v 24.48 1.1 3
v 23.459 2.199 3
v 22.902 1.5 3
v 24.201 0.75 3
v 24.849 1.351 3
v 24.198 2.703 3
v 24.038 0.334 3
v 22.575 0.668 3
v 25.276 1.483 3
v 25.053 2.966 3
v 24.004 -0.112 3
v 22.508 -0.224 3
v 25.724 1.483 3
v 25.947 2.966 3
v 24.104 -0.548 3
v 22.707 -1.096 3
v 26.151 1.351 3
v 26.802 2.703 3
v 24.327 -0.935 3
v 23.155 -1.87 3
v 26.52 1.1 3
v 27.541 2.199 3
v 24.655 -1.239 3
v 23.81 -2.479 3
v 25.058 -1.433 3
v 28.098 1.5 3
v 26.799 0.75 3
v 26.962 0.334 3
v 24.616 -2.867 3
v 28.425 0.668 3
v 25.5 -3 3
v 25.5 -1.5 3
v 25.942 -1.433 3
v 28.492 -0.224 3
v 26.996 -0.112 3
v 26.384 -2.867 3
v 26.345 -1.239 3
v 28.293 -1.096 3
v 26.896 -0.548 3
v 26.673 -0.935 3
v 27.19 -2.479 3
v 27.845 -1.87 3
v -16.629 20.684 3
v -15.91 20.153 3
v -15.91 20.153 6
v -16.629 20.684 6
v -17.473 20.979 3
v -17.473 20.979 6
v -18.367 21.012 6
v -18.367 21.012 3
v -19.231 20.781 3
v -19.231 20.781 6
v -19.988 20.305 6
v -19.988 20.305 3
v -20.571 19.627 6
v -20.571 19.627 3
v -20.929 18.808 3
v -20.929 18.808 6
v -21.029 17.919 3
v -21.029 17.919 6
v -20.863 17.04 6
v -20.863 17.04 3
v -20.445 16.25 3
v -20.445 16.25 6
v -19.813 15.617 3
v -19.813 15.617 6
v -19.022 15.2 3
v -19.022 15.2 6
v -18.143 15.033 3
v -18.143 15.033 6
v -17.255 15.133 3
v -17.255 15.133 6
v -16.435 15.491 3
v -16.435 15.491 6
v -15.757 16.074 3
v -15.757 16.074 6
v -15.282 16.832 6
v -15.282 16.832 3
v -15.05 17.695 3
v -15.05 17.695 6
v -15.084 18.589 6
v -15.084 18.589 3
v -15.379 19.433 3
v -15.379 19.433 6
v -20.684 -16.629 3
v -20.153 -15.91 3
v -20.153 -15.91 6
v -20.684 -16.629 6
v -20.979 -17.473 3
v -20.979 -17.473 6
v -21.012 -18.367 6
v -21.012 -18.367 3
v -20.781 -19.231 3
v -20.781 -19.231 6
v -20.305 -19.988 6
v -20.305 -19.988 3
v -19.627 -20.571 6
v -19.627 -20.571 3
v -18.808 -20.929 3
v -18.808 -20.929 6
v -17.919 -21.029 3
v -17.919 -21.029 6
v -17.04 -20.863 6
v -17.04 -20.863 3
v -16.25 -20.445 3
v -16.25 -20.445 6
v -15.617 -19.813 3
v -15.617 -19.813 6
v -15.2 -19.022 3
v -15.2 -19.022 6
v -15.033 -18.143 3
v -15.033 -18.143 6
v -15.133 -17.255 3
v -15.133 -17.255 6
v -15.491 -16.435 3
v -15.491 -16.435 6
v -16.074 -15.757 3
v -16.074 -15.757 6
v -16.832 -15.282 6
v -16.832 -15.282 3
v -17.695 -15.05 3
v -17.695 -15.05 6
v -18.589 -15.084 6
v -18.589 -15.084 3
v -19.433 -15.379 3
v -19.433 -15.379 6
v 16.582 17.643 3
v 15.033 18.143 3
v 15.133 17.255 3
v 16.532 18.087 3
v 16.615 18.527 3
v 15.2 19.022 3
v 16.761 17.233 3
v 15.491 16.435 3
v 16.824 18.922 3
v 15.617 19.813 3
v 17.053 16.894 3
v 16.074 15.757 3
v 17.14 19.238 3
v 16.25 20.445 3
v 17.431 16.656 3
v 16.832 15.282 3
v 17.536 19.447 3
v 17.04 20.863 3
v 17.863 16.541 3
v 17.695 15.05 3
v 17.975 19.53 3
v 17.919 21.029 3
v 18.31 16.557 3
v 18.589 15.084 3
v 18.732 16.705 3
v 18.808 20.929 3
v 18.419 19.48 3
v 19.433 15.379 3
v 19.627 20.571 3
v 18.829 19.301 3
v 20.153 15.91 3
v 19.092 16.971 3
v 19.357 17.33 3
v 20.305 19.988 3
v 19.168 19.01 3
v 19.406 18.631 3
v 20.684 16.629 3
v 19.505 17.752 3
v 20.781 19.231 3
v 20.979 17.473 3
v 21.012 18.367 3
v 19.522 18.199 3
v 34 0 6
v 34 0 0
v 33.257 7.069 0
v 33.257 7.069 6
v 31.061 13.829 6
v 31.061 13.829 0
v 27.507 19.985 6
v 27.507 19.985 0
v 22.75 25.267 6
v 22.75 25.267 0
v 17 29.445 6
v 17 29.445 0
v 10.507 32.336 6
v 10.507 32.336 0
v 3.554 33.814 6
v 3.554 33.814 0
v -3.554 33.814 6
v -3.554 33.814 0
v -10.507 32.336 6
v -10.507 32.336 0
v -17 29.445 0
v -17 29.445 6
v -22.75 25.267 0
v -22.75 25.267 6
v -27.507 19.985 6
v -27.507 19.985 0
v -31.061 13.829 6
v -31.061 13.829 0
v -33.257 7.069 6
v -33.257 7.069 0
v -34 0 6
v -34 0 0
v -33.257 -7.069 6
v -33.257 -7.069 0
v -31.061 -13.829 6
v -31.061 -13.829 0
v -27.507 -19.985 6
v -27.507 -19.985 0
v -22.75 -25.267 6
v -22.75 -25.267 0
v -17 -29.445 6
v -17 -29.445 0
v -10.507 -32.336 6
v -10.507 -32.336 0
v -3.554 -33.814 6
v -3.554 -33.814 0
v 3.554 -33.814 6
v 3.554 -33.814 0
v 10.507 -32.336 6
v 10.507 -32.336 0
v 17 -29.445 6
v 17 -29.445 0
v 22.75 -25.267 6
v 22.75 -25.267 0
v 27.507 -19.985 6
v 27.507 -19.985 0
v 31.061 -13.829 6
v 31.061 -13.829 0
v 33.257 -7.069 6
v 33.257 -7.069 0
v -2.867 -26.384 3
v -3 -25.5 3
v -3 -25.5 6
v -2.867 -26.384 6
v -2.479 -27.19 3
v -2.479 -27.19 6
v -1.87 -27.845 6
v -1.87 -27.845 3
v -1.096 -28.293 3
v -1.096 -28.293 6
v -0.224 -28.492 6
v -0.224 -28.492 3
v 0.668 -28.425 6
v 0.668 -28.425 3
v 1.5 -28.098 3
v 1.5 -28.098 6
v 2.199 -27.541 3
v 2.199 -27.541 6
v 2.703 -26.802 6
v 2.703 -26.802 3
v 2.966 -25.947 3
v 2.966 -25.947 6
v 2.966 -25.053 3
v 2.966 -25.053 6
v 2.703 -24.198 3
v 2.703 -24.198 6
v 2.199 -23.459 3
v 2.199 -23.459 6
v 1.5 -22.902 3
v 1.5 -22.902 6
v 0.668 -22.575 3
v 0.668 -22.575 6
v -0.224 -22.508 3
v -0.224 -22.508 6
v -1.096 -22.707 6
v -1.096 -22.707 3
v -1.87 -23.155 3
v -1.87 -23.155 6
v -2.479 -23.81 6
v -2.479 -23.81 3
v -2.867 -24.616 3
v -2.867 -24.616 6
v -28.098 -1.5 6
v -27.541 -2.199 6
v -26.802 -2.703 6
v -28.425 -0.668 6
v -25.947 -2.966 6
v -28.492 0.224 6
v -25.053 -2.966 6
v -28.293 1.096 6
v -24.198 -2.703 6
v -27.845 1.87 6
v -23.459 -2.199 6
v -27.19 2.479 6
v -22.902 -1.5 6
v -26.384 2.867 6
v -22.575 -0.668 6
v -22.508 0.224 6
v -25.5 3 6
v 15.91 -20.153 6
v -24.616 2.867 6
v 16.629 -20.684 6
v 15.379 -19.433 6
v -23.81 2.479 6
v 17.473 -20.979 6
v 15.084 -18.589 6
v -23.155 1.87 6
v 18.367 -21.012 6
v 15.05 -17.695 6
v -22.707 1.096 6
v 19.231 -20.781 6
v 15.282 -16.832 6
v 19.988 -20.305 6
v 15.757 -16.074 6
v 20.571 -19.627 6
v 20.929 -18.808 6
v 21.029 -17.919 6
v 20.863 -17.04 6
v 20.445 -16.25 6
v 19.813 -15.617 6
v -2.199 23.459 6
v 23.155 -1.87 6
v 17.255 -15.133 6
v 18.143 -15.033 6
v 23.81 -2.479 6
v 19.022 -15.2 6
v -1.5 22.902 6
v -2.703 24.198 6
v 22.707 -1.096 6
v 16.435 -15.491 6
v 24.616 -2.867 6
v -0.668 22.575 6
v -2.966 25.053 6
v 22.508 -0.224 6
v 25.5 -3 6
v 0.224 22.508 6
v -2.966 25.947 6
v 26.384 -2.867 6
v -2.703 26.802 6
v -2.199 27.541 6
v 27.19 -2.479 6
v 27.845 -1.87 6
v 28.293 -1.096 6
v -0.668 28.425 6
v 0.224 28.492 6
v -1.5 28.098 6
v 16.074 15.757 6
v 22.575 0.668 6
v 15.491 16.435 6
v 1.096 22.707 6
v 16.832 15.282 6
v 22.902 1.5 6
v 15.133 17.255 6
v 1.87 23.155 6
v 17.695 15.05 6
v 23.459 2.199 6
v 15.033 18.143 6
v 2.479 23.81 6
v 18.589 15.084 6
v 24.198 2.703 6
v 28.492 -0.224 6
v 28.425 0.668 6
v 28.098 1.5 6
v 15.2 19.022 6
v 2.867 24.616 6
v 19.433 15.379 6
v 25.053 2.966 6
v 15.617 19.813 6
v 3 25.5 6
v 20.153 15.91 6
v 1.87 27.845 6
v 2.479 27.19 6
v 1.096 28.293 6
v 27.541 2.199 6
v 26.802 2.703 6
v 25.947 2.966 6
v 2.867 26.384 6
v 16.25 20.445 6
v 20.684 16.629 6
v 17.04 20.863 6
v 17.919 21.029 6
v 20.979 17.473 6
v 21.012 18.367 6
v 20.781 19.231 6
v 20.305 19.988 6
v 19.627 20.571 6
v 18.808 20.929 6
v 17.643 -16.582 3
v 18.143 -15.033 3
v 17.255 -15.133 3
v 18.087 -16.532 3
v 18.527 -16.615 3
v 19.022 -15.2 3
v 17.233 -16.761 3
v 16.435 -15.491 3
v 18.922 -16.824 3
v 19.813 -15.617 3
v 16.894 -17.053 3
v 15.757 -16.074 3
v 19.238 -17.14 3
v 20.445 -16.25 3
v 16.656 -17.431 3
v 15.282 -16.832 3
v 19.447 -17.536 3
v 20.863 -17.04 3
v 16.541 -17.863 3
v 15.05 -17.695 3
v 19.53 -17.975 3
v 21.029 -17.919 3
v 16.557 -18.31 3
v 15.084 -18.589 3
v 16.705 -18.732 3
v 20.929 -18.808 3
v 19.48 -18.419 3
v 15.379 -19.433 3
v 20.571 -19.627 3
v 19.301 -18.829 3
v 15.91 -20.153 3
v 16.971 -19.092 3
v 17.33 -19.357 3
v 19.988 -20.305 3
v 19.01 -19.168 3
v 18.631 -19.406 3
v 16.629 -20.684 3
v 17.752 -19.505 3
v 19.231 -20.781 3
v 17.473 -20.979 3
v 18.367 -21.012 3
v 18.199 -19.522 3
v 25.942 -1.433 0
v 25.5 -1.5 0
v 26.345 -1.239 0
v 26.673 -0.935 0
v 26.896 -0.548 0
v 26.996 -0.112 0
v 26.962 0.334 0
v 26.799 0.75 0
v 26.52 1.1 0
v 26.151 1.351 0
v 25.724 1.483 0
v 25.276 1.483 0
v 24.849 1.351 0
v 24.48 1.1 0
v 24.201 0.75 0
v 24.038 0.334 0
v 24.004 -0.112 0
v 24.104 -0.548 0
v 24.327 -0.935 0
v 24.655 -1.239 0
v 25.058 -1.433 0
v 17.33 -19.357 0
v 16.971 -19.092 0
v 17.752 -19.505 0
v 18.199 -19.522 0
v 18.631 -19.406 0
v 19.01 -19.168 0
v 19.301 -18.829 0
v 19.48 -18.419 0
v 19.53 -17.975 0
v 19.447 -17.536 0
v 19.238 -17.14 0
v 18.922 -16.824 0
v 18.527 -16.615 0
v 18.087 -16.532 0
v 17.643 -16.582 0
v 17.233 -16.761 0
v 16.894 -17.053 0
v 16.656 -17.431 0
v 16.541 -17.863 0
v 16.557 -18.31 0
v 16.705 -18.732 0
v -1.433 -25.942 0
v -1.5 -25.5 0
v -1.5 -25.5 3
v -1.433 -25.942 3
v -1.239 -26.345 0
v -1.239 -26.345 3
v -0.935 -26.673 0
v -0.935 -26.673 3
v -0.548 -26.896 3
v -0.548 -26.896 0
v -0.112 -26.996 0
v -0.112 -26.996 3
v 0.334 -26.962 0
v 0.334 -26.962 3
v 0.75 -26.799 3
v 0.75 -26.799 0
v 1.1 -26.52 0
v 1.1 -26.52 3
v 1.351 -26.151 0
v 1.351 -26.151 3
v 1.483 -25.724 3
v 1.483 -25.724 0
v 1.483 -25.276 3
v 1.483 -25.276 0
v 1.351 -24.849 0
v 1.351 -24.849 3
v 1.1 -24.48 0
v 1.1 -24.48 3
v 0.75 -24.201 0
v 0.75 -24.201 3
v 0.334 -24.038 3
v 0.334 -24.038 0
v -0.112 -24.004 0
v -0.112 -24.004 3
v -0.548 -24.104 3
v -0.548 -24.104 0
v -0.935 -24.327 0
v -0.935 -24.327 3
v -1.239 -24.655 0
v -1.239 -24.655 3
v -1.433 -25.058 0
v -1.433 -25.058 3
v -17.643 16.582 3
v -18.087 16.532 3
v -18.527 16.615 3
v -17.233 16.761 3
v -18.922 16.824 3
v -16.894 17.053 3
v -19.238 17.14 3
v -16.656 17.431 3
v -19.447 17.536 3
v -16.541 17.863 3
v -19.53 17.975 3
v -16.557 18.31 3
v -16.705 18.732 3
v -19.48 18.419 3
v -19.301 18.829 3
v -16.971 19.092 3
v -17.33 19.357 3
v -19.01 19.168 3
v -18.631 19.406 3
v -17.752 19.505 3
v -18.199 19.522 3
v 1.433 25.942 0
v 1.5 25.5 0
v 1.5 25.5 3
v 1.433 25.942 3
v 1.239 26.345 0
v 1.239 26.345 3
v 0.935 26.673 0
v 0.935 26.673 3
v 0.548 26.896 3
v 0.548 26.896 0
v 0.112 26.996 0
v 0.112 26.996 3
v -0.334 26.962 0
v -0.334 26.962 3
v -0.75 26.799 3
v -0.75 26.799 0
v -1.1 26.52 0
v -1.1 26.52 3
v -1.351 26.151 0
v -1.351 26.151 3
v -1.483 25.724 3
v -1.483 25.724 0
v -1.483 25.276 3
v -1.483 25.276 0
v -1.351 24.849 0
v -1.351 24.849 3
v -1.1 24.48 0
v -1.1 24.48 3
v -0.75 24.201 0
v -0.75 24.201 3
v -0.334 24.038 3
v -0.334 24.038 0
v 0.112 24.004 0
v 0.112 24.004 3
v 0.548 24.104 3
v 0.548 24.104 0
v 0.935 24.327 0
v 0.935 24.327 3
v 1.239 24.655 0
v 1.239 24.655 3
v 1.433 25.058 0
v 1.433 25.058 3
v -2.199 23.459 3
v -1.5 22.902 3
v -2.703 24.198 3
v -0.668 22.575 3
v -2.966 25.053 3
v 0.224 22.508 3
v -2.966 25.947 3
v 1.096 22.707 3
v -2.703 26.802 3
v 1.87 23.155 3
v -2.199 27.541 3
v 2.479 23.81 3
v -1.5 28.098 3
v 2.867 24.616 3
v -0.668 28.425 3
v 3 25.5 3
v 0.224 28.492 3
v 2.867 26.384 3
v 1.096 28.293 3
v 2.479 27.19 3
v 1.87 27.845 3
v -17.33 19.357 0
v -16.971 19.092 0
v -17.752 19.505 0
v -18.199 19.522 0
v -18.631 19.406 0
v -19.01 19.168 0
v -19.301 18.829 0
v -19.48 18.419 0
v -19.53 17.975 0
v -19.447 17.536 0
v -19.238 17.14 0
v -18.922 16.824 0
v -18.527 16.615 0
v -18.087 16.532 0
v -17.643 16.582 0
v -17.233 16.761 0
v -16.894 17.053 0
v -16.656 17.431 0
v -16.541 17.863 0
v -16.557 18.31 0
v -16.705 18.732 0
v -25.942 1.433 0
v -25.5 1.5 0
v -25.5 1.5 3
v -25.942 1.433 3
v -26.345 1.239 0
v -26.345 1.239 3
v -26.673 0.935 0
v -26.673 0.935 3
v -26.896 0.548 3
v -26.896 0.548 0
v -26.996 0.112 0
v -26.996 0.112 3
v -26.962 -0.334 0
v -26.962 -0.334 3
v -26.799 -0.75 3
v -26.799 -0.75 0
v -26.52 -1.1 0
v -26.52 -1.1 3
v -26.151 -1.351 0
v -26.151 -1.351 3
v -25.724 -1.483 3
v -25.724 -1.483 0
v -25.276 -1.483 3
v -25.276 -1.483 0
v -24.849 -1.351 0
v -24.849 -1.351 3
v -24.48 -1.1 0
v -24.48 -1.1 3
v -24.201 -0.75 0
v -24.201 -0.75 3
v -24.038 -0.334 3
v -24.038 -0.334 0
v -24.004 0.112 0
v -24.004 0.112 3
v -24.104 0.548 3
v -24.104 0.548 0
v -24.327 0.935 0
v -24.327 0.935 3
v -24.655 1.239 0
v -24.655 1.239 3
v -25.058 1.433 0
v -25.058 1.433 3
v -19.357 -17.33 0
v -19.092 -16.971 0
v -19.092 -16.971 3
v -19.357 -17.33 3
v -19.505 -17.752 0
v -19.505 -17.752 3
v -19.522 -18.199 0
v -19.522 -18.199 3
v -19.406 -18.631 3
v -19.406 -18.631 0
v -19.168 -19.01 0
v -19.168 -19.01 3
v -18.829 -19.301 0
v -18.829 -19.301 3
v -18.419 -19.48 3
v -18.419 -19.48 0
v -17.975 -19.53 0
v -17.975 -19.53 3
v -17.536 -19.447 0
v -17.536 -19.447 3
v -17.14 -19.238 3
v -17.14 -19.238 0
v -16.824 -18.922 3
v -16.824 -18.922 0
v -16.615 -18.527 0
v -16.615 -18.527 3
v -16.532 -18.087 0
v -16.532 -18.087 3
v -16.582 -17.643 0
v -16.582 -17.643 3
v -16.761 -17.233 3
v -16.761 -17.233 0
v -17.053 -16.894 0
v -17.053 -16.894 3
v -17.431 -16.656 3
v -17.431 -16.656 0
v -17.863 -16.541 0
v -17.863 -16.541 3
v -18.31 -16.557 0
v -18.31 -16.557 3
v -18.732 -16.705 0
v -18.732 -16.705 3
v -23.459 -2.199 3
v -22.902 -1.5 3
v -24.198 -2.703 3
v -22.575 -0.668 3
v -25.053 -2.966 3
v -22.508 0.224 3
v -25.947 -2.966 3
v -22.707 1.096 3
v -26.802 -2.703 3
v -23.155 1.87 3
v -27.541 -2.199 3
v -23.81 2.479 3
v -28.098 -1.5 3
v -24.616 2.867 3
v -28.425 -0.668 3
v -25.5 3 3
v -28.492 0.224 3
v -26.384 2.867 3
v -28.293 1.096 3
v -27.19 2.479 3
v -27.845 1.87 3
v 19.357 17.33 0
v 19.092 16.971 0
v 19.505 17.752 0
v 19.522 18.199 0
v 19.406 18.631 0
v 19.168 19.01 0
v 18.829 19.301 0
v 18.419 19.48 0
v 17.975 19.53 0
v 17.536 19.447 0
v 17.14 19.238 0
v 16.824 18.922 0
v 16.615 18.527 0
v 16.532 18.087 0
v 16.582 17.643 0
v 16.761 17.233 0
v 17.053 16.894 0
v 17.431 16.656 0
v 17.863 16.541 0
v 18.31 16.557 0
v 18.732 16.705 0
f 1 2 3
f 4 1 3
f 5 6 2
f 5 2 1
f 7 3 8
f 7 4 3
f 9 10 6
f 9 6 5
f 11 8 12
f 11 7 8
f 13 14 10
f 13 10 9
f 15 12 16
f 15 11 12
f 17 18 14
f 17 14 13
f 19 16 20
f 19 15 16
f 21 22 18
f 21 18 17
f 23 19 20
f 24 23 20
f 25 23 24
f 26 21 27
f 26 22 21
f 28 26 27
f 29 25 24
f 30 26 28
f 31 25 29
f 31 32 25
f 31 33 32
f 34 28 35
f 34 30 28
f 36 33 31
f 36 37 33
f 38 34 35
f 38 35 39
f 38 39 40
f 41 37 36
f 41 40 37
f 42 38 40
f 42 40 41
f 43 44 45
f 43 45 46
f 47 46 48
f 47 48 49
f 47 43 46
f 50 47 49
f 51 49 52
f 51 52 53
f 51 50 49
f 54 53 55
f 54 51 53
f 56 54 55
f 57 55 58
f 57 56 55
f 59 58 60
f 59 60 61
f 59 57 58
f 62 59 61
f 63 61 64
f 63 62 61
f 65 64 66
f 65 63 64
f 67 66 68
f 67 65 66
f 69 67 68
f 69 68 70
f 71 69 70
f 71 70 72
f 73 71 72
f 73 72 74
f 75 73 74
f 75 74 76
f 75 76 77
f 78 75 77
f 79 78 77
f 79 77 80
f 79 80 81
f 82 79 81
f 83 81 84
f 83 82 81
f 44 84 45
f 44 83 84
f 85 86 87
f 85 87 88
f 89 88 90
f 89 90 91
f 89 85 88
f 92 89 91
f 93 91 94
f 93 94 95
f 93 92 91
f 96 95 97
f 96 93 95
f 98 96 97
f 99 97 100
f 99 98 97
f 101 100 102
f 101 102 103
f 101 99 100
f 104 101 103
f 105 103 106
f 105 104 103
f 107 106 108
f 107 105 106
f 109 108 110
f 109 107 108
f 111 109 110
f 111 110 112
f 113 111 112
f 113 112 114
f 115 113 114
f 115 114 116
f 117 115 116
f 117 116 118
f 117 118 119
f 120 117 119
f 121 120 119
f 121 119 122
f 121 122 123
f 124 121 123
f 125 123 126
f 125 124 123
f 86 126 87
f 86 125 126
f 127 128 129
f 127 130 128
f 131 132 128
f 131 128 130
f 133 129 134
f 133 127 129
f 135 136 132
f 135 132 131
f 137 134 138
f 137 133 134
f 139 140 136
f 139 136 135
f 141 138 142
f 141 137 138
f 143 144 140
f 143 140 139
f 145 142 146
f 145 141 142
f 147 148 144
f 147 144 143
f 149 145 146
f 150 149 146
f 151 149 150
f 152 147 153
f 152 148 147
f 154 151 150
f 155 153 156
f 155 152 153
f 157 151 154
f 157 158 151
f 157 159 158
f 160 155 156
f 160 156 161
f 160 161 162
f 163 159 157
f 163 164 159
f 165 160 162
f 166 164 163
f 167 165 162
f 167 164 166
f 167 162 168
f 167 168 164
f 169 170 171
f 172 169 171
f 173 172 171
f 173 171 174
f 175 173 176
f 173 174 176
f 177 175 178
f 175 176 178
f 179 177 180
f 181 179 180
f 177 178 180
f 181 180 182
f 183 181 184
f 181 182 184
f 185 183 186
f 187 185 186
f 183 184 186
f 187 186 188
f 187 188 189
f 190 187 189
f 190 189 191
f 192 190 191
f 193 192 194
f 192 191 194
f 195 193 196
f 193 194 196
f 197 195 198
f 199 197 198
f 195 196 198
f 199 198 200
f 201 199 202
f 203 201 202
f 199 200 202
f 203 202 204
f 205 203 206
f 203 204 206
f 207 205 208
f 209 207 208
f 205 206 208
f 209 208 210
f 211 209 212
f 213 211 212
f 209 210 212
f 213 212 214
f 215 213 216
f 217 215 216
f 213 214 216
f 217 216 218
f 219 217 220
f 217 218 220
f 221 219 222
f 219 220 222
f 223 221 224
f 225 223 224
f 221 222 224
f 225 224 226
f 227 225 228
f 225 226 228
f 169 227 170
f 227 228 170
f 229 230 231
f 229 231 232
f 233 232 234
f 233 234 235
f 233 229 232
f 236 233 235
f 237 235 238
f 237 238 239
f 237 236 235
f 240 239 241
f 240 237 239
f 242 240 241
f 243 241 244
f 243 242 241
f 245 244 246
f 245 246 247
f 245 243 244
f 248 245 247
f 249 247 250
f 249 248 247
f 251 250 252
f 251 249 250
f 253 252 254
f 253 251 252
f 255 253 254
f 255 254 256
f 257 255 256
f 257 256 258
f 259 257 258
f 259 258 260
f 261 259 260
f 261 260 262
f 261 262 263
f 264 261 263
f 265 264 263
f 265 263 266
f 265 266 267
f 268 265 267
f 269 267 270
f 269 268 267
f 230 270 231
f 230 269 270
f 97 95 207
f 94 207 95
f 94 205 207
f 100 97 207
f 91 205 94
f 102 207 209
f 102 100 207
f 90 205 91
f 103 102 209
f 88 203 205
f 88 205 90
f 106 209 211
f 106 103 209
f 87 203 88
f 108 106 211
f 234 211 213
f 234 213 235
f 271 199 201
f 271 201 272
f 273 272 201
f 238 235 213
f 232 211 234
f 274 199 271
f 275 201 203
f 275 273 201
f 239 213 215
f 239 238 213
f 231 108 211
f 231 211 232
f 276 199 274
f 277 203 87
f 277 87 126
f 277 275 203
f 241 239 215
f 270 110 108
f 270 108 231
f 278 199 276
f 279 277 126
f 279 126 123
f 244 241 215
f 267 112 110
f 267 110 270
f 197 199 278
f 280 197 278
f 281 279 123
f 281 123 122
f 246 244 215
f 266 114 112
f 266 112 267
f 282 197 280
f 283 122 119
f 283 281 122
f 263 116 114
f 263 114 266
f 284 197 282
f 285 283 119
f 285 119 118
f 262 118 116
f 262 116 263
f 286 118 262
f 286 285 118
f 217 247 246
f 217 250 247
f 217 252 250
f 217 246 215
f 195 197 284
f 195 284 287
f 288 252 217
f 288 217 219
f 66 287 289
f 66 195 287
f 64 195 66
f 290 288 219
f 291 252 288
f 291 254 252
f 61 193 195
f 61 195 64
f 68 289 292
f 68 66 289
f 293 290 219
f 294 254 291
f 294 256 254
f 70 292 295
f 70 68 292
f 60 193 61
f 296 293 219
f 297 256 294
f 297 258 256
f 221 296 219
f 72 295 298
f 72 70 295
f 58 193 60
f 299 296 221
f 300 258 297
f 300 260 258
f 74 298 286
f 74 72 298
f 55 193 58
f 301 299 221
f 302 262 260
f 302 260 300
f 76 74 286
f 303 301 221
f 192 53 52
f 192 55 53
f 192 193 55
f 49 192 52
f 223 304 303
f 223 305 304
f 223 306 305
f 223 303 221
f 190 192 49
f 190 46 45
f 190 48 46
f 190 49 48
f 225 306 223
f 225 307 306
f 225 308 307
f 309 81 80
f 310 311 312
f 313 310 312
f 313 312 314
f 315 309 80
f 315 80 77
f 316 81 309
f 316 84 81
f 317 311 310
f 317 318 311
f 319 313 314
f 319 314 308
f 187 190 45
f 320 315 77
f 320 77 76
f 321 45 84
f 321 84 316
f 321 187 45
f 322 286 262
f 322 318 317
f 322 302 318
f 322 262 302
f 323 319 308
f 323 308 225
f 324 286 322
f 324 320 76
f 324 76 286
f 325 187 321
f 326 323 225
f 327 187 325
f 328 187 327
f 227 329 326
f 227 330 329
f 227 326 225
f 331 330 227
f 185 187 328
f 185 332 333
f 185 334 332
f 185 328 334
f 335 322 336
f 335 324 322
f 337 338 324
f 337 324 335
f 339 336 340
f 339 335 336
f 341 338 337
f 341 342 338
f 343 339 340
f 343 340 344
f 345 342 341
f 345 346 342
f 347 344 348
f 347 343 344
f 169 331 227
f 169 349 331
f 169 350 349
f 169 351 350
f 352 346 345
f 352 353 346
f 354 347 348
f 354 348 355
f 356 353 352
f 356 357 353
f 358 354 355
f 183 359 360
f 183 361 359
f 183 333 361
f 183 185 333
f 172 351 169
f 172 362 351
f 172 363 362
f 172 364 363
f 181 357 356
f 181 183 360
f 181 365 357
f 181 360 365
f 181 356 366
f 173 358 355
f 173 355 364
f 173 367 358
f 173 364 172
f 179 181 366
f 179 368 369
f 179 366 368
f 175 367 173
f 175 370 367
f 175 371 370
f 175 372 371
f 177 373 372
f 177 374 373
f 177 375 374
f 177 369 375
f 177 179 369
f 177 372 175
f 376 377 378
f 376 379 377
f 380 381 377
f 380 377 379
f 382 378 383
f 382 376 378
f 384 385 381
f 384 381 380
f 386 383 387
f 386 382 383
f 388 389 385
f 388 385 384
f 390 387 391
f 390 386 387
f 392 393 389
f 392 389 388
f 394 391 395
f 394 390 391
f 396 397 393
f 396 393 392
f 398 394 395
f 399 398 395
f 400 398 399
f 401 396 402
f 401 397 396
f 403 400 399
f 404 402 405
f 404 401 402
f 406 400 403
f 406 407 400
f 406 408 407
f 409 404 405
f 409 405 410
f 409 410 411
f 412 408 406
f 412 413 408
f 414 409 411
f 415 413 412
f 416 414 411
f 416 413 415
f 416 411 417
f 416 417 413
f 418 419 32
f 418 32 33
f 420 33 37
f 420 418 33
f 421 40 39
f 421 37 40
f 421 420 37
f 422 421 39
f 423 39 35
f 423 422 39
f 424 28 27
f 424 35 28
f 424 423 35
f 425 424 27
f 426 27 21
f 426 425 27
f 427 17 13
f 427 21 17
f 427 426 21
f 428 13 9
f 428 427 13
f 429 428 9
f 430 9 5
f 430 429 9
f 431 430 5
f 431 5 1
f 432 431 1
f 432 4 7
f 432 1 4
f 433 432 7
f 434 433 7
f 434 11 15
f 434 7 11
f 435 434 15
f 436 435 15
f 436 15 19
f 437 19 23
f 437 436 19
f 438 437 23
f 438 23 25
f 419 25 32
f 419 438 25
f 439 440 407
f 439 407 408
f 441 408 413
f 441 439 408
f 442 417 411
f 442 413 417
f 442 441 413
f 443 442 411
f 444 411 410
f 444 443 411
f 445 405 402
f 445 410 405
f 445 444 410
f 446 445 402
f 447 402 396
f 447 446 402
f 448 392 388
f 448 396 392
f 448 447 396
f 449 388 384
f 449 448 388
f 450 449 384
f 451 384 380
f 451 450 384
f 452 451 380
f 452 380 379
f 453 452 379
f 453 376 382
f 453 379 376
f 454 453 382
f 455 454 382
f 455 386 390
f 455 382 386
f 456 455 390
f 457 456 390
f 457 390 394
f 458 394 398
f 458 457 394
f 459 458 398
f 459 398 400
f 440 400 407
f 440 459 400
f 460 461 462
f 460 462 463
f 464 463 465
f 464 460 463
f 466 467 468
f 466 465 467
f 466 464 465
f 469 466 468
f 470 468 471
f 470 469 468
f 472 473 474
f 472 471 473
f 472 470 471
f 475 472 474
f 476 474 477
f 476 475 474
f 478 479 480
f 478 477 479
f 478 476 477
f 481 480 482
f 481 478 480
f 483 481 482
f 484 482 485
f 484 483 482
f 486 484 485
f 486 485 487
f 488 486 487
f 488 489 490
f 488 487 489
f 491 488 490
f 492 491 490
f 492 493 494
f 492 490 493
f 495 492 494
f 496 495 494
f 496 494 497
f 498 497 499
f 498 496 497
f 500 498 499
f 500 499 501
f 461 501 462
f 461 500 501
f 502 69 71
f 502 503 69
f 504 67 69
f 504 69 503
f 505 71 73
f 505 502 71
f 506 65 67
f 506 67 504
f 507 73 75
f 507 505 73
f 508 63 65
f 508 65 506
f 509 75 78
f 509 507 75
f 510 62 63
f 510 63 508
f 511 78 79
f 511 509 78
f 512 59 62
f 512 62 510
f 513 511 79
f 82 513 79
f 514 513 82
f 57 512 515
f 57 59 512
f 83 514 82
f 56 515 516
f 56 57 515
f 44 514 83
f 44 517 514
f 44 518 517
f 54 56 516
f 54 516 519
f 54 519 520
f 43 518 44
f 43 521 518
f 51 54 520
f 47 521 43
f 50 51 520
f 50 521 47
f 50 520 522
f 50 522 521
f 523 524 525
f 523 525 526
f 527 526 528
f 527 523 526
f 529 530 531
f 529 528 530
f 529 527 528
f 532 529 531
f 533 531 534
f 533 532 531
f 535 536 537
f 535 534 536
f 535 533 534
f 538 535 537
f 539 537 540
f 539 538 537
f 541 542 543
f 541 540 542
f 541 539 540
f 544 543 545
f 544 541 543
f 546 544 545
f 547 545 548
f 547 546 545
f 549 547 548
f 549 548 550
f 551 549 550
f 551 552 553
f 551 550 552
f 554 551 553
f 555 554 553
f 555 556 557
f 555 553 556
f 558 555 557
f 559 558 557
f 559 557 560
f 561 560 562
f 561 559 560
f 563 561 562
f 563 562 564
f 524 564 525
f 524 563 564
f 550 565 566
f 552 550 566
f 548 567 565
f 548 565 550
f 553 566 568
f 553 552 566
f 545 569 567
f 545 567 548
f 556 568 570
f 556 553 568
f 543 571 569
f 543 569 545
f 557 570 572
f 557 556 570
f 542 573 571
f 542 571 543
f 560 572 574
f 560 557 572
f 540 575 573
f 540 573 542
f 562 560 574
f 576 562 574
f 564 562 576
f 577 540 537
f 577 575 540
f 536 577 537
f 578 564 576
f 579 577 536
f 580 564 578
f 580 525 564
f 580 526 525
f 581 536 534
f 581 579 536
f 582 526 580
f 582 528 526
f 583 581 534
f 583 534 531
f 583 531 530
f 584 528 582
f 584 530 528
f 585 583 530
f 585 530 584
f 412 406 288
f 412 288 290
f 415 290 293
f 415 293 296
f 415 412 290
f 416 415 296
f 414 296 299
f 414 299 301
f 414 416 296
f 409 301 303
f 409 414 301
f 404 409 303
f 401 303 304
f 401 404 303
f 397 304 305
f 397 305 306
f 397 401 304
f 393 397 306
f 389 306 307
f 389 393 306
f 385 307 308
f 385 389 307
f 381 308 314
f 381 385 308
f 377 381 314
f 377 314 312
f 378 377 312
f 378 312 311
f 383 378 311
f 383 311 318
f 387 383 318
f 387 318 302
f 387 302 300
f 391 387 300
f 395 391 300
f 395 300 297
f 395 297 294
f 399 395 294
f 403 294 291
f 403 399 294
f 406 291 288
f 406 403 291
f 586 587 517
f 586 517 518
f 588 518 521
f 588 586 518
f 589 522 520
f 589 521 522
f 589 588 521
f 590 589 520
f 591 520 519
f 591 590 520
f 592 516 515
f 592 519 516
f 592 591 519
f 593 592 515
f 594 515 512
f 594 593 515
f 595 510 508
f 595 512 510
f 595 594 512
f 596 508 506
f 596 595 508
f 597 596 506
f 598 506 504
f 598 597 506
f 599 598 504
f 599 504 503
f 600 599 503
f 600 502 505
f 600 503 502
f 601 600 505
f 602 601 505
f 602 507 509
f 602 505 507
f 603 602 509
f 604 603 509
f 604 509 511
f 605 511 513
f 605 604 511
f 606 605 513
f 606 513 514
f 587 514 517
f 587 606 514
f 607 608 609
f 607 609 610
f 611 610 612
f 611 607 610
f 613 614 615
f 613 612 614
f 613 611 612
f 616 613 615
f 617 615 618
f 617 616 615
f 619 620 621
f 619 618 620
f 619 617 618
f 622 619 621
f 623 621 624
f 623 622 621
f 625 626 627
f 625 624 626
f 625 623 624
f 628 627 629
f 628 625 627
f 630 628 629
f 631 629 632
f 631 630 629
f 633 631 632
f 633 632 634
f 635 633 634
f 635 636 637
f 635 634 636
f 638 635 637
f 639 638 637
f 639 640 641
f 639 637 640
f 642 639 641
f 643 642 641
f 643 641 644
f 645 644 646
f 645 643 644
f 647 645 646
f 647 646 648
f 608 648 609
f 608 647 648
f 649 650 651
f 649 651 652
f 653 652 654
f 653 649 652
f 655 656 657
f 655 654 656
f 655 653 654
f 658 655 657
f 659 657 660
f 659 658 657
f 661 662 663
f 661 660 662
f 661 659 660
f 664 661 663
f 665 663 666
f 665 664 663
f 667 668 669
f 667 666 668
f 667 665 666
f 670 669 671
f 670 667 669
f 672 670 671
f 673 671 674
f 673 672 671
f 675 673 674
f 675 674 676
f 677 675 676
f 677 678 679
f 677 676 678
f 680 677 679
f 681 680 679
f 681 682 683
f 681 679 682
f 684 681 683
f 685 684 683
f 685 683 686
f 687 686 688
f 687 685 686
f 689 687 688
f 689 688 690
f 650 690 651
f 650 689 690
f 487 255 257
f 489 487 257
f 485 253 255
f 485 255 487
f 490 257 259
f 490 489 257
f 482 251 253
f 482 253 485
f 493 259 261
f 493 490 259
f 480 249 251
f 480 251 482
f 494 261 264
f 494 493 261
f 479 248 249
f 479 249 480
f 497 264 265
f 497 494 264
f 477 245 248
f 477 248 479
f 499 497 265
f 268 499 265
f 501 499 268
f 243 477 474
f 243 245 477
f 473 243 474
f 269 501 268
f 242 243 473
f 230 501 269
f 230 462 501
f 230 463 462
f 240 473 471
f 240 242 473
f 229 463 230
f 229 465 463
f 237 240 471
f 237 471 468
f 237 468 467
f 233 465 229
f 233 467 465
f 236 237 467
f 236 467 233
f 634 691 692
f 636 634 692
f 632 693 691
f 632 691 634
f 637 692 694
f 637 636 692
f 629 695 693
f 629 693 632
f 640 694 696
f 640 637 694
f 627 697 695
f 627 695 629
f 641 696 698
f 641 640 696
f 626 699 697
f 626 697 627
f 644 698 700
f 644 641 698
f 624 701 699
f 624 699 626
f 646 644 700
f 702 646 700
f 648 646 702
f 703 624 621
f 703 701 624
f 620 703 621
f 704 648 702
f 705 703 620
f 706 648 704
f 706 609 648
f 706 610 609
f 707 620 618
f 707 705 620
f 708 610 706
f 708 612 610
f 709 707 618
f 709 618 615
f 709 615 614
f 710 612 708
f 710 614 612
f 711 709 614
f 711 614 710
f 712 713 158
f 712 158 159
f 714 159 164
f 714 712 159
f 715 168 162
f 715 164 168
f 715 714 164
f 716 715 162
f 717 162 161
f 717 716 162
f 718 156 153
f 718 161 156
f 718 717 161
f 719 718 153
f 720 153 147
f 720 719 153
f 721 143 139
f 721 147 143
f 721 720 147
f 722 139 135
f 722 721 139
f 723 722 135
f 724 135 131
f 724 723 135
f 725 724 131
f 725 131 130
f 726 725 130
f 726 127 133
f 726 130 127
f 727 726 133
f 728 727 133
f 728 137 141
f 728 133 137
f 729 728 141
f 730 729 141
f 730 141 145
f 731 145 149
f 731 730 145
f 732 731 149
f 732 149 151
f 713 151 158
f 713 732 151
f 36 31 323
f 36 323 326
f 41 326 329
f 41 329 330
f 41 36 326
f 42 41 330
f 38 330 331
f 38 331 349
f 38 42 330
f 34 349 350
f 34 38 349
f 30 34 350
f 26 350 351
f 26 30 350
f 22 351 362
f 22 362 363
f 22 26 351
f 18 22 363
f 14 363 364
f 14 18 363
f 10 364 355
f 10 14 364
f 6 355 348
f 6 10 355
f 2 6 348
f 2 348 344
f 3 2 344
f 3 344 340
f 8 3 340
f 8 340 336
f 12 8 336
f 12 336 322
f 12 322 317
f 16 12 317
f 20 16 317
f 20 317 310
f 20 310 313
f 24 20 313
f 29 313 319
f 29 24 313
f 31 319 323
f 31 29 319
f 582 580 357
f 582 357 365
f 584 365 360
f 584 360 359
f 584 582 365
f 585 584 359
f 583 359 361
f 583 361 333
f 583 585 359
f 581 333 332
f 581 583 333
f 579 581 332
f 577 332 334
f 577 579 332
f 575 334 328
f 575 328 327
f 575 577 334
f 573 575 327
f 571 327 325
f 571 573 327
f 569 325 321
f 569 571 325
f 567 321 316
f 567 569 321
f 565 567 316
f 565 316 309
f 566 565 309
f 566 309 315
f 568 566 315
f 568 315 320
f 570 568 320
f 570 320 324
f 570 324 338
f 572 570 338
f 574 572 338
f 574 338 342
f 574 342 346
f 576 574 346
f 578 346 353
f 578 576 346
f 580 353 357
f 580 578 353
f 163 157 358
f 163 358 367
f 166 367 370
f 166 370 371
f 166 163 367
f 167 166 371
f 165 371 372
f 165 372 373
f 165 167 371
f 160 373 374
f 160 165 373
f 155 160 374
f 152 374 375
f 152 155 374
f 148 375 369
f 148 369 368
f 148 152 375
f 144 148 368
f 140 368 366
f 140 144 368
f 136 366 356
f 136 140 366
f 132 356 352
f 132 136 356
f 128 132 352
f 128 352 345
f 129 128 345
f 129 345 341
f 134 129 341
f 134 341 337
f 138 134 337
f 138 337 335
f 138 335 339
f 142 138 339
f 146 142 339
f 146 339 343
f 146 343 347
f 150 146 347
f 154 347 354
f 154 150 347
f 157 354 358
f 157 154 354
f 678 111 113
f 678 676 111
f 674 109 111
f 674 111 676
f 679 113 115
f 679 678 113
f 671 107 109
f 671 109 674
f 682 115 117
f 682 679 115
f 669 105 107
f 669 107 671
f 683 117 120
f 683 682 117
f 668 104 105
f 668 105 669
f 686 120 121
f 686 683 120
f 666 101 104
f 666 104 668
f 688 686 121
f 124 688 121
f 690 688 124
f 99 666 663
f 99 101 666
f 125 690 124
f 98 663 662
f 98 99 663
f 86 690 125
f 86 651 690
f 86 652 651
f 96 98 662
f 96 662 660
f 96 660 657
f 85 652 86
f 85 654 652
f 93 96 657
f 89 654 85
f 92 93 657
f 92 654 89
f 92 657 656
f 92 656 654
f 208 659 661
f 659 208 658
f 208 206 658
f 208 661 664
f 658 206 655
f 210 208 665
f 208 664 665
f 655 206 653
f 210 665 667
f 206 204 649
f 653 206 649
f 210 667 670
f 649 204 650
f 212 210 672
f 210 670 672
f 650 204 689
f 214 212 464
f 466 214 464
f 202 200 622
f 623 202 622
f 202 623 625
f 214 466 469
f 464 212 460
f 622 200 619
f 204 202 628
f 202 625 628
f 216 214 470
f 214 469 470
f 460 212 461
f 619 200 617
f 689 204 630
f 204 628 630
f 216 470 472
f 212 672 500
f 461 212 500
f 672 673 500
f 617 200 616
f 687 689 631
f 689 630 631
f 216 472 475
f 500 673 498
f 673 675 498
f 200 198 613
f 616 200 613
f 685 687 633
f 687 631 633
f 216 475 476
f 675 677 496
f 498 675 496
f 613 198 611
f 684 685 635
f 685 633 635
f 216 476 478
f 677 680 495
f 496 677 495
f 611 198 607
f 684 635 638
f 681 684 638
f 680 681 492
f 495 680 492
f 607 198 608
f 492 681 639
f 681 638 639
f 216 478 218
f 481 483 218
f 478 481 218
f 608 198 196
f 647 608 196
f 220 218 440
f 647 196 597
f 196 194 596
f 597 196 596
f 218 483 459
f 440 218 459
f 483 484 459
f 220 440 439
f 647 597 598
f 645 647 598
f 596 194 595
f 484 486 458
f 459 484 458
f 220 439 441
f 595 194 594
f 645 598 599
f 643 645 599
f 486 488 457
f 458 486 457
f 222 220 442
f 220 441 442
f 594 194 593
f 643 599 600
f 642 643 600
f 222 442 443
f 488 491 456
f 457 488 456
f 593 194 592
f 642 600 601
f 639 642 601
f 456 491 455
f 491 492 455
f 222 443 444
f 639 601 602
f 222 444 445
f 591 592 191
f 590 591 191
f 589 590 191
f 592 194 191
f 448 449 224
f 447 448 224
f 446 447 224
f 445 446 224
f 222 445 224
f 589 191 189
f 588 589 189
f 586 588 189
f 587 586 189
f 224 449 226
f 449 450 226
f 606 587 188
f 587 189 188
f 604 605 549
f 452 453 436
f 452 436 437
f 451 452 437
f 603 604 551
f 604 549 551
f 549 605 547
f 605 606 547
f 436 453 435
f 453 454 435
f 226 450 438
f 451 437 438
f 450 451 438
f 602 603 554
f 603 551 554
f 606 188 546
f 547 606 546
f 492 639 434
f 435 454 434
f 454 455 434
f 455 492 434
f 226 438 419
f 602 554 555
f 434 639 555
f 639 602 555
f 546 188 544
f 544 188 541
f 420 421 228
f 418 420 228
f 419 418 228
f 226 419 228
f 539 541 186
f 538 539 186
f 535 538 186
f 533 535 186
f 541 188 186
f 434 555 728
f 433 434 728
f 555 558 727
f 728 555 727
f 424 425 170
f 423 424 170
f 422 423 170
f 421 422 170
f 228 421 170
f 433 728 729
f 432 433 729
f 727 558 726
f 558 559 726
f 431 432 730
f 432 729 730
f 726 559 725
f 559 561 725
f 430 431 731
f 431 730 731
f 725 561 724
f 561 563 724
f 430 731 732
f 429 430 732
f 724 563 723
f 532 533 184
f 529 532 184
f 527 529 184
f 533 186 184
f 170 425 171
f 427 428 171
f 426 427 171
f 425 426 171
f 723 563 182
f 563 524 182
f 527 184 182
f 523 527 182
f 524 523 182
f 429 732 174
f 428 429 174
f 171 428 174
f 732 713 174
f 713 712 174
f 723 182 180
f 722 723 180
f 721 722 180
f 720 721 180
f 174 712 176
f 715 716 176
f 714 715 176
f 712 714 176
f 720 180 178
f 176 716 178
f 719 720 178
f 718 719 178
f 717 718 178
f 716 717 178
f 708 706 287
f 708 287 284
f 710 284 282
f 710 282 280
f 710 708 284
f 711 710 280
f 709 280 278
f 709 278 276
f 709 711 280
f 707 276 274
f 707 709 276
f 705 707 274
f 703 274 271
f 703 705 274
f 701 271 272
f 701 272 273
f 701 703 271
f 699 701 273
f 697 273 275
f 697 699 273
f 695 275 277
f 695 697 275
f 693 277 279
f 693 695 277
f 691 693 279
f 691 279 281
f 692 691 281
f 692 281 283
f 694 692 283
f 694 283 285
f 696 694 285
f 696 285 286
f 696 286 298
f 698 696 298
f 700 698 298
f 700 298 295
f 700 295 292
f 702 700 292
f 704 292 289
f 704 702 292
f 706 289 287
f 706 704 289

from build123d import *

# Parameters (mm, degrees)
CYLINDER796_R                = 1.5
CYLINDER796_DEPTH            = 20
CYLINDER796_PLACEMENT_ANGLE  = 45
CYLINDER797_R                = 1.5
CYLINDER797_DEPTH            = 20
CYLINDER798_R                = 1.5
CYLINDER798_DEPTH            = 20
CYLINDER798_PLACEMENT_ANGLE  = 135
CYLINDER799_R                = 1.5
CYLINDER799_DEPTH            = 20
CYLINDER800_R                = 1.5
CYLINDER800_DEPTH            = 20
CYLINDER800_PLACEMENT_ANGLE  = 225
CYLINDER801_R                = 1.5
CYLINDER801_DEPTH            = 20
CYLINDER802_R                = 1.5
CYLINDER802_DEPTH            = 20
CYLINDER802_PLACEMENT_ANGLE  = 45
CYLINDER794_R                = 1.5
CYLINDER794_DEPTH            = 20
CYLINDER803_R                = 3
CYLINDER803_DEPTH            = 3
CYLINDER803_PLACEMENT_ANGLE  = 45
CYLINDER1815_R               = 3
CYLINDER1815_DEPTH           = 3
CYLINDER1814_R               = 3
CYLINDER1814_DEPTH           = 3
CYLINDER1814_PLACEMENT_ANGLE = 135
CYLINDER1806_R               = 3
CYLINDER1806_DEPTH           = 3
CYLINDER1810_R               = 3
CYLINDER1810_DEPTH           = 3
CYLINDER1810_PLACEMENT_ANGLE = 225
CYLINDER1807_R               = 3
CYLINDER1807_DEPTH           = 3
CYLINDER1808_R               = 3
CYLINDER1808_DEPTH           = 3
CYLINDER1808_PLACEMENT_ANGLE = 45
CYLINDER795_R                = 3
CYLINDER795_DEPTH            = 3
CYLINDER257_R                = 34
CYLINDER257_DEPTH            = 6


with BuildPart() as v_lec796:
    # Cylinder796 → Cylinder796 (new body)
    with BuildSketch(Plane.XY):
        Circle(CYLINDER796_R)
    extrude(amount=CYLINDER796_DEPTH)


with BuildPart() as v_lec796_1:
    # Cylinder796 placement: moved
    add(v_lec796.part.moved(Location((-18.031223, 18.031223, -4))).rotate(Axis((-18.031223, 18.031223, -4), (0, 0, 1)), CYLINDER796_PLACEMENT_ANGLE))


with BuildPart() as v_lec797:
    # Cylinder797 → Cylinder797 (new body)
    with BuildSketch(Plane(origin=(-25.5, 0, -4), x_dir=(0, 1, 0), z_dir=(0, 0, 1))):
        Circle(CYLINDER797_R)
    extrude(amount=CYLINDER797_DEPTH)


with BuildPart() as v_lec798:
    # Cylinder798 → Cylinder798 (new body)
    with BuildSketch(Plane.XY):
        Circle(CYLINDER798_R)
    extrude(amount=CYLINDER798_DEPTH)


with BuildPart() as v_lec798_1:
    # Cylinder798 placement: moved
    add(v_lec798.part.moved(Location((-18.031223, -18.031223, -4))).rotate(Axis((-18.031223, -18.031223, -4), (0, 0, 1)), CYLINDER798_PLACEMENT_ANGLE))


with BuildPart() as v_lec799:
    # Cylinder799 → Cylinder799 (new body)
    with BuildSketch(Plane(origin=(0, -25.5, -4), x_dir=(-1, 0, 0), z_dir=(0, 0, 1))):
        Circle(CYLINDER799_R)
    extrude(amount=CYLINDER799_DEPTH)


with BuildPart() as v_lec800:
    # Cylinder800 → Cylinder800 (new body)
    with BuildSketch(Plane.XY):
        Circle(CYLINDER800_R)
    extrude(amount=CYLINDER800_DEPTH)


with BuildPart() as v_lec800_1:
    # Cylinder800 placement: moved
    add(v_lec800.part.moved(Location((18.031223, -18.031223, -4))).rotate(Axis((18.031223, -18.031223, -4), (0, 0, 1)), CYLINDER800_PLACEMENT_ANGLE))


with BuildPart() as v_lec801:
    # Cylinder801 → Cylinder801 (new body)
    with BuildSketch(Plane(origin=(25.5, 0, -4), x_dir=(0, -1, 0), z_dir=(0, 0, 1))):
        Circle(CYLINDER801_R)
    extrude(amount=CYLINDER801_DEPTH)


with BuildPart() as v_lec802:
    # Cylinder802 → Cylinder802 (new body)
    with BuildSketch(Plane.XY):
        Circle(CYLINDER802_R)
    extrude(amount=CYLINDER802_DEPTH)


with BuildPart() as v_lec802_1:
    # Cylinder802 placement: moved
    add(v_lec802.part.moved(Location((18.031223, 18.031223, -4))).rotate(Axis((18.031223, 18.031223, -4), (0, 0, -1)), CYLINDER802_PLACEMENT_ANGLE))


with BuildPart() as compound003:
    # Cylinder794 → Cylinder794 (new body)
    with BuildSketch(Plane(origin=(0, 25.5, -4), x_dir=(1, 0, 0), z_dir=(0, 0, 1))):
        Circle(CYLINDER794_R)
    extrude(amount=CYLINDER794_DEPTH)

    # Compound003: union Válec796, Válec797, Válec798, Válec799, Válec800, Válec801, Válec802
    add(v_lec796_1.part)
    add(v_lec797.part)
    add(v_lec798_1.part)
    add(v_lec799.part)
    add(v_lec800_1.part)
    add(v_lec801.part)
    add(v_lec802_1.part)


with BuildPart() as v_lec803:
    # Cylinder803 → Cylinder803 (new body)
    with BuildSketch(Plane.XY):
        Circle(CYLINDER803_R)
    extrude(amount=CYLINDER803_DEPTH)


with BuildPart() as v_lec803_1:
    # Cylinder803 placement: moved
    add(v_lec803.part.moved(Location((-18.031223, 18.031223, 3))).rotate(Axis((-18.031223, 18.031223, 3), (0, 0, 1)), CYLINDER803_PLACEMENT_ANGLE))


with BuildPart() as v_lec1815:
    # Cylinder1815 → Cylinder1815 (new body)
    with BuildSketch(Plane(origin=(-25.5, 0, 3), x_dir=(0, 1, 0), z_dir=(0, 0, 1))):
        Circle(CYLINDER1815_R)
    extrude(amount=CYLINDER1815_DEPTH)


with BuildPart() as v_lec1814:
    # Cylinder1814 → Cylinder1814 (new body)
    with BuildSketch(Plane.XY):
        Circle(CYLINDER1814_R)
    extrude(amount=CYLINDER1814_DEPTH)


with BuildPart() as v_lec1814_1:
    # Cylinder1814 placement: moved
    add(v_lec1814.part.moved(Location((-18.031223, -18.031223, 3))).rotate(Axis((-18.031223, -18.031223, 3), (0, 0, 1)), CYLINDER1814_PLACEMENT_ANGLE))


with BuildPart() as v_lec1806:
    # Cylinder1806 → Cylinder1806 (new body)
    with BuildSketch(Plane(origin=(0, -25.5, 3), x_dir=(-1, 0, 0), z_dir=(0, 0, 1))):
        Circle(CYLINDER1806_R)
    extrude(amount=CYLINDER1806_DEPTH)


with BuildPart() as v_lec1810:
    # Cylinder1810 → Cylinder1810 (new body)
    with BuildSketch(Plane.XY):
        Circle(CYLINDER1810_R)
    extrude(amount=CYLINDER1810_DEPTH)


with BuildPart() as v_lec1810_1:
    # Cylinder1810 placement: moved
    add(v_lec1810.part.moved(Location((18.031223, -18.031223, 3))).rotate(Axis((18.031223, -18.031223, 3), (0, 0, 1)), CYLINDER1810_PLACEMENT_ANGLE))


with BuildPart() as v_lec1807:
    # Cylinder1807 → Cylinder1807 (new body)
    with BuildSketch(Plane(origin=(25.5, 0, 3), x_dir=(0, -1, 0), z_dir=(0, 0, 1))):
        Circle(CYLINDER1807_R)
    extrude(amount=CYLINDER1807_DEPTH)


with BuildPart() as v_lec1808:
    # Cylinder1808 → Cylinder1808 (new body)
    with BuildSketch(Plane.XY):
        Circle(CYLINDER1808_R)
    extrude(amount=CYLINDER1808_DEPTH)


with BuildPart() as v_lec1808_1:
    # Cylinder1808 placement: moved
    add(v_lec1808.part.moved(Location((18.031223, 18.031223, 3))).rotate(Axis((18.031223, 18.031223, 3), (0, 0, -1)), CYLINDER1808_PLACEMENT_ANGLE))


with BuildPart() as compound004:
    # Cylinder795 → Cylinder795 (new body)
    with BuildSketch(Plane(origin=(0, 25.5, 3), x_dir=(1, 0, 0), z_dir=(0, 0, 1))):
        Circle(CYLINDER795_R)
    extrude(amount=CYLINDER795_DEPTH)

    # Compound004: union Válec803, Válec1815, Válec1814, Válec1806, Válec1810, Válec1807, Válec1808
    add(v_lec803_1.part)
    add(v_lec1815.part)
    add(v_lec1814_1.part)
    add(v_lec1806.part)
    add(v_lec1810_1.part)
    add(v_lec1807.part)
    add(v_lec1808_1.part)


with BuildPart() as cut003:
    # Cylinder257 → Cylinder257 (new body)
    with BuildSketch(Plane.XY):
        Circle(CYLINDER257_R)
    extrude(amount=CYLINDER257_DEPTH)

    # Cut002: cut Compound004
    add(compound004.part, mode=Mode.SUBTRACT)

    # Cut003: cut Compound003
    add(compound003.part, mode=Mode.SUBTRACT)


solid = cut003.part
